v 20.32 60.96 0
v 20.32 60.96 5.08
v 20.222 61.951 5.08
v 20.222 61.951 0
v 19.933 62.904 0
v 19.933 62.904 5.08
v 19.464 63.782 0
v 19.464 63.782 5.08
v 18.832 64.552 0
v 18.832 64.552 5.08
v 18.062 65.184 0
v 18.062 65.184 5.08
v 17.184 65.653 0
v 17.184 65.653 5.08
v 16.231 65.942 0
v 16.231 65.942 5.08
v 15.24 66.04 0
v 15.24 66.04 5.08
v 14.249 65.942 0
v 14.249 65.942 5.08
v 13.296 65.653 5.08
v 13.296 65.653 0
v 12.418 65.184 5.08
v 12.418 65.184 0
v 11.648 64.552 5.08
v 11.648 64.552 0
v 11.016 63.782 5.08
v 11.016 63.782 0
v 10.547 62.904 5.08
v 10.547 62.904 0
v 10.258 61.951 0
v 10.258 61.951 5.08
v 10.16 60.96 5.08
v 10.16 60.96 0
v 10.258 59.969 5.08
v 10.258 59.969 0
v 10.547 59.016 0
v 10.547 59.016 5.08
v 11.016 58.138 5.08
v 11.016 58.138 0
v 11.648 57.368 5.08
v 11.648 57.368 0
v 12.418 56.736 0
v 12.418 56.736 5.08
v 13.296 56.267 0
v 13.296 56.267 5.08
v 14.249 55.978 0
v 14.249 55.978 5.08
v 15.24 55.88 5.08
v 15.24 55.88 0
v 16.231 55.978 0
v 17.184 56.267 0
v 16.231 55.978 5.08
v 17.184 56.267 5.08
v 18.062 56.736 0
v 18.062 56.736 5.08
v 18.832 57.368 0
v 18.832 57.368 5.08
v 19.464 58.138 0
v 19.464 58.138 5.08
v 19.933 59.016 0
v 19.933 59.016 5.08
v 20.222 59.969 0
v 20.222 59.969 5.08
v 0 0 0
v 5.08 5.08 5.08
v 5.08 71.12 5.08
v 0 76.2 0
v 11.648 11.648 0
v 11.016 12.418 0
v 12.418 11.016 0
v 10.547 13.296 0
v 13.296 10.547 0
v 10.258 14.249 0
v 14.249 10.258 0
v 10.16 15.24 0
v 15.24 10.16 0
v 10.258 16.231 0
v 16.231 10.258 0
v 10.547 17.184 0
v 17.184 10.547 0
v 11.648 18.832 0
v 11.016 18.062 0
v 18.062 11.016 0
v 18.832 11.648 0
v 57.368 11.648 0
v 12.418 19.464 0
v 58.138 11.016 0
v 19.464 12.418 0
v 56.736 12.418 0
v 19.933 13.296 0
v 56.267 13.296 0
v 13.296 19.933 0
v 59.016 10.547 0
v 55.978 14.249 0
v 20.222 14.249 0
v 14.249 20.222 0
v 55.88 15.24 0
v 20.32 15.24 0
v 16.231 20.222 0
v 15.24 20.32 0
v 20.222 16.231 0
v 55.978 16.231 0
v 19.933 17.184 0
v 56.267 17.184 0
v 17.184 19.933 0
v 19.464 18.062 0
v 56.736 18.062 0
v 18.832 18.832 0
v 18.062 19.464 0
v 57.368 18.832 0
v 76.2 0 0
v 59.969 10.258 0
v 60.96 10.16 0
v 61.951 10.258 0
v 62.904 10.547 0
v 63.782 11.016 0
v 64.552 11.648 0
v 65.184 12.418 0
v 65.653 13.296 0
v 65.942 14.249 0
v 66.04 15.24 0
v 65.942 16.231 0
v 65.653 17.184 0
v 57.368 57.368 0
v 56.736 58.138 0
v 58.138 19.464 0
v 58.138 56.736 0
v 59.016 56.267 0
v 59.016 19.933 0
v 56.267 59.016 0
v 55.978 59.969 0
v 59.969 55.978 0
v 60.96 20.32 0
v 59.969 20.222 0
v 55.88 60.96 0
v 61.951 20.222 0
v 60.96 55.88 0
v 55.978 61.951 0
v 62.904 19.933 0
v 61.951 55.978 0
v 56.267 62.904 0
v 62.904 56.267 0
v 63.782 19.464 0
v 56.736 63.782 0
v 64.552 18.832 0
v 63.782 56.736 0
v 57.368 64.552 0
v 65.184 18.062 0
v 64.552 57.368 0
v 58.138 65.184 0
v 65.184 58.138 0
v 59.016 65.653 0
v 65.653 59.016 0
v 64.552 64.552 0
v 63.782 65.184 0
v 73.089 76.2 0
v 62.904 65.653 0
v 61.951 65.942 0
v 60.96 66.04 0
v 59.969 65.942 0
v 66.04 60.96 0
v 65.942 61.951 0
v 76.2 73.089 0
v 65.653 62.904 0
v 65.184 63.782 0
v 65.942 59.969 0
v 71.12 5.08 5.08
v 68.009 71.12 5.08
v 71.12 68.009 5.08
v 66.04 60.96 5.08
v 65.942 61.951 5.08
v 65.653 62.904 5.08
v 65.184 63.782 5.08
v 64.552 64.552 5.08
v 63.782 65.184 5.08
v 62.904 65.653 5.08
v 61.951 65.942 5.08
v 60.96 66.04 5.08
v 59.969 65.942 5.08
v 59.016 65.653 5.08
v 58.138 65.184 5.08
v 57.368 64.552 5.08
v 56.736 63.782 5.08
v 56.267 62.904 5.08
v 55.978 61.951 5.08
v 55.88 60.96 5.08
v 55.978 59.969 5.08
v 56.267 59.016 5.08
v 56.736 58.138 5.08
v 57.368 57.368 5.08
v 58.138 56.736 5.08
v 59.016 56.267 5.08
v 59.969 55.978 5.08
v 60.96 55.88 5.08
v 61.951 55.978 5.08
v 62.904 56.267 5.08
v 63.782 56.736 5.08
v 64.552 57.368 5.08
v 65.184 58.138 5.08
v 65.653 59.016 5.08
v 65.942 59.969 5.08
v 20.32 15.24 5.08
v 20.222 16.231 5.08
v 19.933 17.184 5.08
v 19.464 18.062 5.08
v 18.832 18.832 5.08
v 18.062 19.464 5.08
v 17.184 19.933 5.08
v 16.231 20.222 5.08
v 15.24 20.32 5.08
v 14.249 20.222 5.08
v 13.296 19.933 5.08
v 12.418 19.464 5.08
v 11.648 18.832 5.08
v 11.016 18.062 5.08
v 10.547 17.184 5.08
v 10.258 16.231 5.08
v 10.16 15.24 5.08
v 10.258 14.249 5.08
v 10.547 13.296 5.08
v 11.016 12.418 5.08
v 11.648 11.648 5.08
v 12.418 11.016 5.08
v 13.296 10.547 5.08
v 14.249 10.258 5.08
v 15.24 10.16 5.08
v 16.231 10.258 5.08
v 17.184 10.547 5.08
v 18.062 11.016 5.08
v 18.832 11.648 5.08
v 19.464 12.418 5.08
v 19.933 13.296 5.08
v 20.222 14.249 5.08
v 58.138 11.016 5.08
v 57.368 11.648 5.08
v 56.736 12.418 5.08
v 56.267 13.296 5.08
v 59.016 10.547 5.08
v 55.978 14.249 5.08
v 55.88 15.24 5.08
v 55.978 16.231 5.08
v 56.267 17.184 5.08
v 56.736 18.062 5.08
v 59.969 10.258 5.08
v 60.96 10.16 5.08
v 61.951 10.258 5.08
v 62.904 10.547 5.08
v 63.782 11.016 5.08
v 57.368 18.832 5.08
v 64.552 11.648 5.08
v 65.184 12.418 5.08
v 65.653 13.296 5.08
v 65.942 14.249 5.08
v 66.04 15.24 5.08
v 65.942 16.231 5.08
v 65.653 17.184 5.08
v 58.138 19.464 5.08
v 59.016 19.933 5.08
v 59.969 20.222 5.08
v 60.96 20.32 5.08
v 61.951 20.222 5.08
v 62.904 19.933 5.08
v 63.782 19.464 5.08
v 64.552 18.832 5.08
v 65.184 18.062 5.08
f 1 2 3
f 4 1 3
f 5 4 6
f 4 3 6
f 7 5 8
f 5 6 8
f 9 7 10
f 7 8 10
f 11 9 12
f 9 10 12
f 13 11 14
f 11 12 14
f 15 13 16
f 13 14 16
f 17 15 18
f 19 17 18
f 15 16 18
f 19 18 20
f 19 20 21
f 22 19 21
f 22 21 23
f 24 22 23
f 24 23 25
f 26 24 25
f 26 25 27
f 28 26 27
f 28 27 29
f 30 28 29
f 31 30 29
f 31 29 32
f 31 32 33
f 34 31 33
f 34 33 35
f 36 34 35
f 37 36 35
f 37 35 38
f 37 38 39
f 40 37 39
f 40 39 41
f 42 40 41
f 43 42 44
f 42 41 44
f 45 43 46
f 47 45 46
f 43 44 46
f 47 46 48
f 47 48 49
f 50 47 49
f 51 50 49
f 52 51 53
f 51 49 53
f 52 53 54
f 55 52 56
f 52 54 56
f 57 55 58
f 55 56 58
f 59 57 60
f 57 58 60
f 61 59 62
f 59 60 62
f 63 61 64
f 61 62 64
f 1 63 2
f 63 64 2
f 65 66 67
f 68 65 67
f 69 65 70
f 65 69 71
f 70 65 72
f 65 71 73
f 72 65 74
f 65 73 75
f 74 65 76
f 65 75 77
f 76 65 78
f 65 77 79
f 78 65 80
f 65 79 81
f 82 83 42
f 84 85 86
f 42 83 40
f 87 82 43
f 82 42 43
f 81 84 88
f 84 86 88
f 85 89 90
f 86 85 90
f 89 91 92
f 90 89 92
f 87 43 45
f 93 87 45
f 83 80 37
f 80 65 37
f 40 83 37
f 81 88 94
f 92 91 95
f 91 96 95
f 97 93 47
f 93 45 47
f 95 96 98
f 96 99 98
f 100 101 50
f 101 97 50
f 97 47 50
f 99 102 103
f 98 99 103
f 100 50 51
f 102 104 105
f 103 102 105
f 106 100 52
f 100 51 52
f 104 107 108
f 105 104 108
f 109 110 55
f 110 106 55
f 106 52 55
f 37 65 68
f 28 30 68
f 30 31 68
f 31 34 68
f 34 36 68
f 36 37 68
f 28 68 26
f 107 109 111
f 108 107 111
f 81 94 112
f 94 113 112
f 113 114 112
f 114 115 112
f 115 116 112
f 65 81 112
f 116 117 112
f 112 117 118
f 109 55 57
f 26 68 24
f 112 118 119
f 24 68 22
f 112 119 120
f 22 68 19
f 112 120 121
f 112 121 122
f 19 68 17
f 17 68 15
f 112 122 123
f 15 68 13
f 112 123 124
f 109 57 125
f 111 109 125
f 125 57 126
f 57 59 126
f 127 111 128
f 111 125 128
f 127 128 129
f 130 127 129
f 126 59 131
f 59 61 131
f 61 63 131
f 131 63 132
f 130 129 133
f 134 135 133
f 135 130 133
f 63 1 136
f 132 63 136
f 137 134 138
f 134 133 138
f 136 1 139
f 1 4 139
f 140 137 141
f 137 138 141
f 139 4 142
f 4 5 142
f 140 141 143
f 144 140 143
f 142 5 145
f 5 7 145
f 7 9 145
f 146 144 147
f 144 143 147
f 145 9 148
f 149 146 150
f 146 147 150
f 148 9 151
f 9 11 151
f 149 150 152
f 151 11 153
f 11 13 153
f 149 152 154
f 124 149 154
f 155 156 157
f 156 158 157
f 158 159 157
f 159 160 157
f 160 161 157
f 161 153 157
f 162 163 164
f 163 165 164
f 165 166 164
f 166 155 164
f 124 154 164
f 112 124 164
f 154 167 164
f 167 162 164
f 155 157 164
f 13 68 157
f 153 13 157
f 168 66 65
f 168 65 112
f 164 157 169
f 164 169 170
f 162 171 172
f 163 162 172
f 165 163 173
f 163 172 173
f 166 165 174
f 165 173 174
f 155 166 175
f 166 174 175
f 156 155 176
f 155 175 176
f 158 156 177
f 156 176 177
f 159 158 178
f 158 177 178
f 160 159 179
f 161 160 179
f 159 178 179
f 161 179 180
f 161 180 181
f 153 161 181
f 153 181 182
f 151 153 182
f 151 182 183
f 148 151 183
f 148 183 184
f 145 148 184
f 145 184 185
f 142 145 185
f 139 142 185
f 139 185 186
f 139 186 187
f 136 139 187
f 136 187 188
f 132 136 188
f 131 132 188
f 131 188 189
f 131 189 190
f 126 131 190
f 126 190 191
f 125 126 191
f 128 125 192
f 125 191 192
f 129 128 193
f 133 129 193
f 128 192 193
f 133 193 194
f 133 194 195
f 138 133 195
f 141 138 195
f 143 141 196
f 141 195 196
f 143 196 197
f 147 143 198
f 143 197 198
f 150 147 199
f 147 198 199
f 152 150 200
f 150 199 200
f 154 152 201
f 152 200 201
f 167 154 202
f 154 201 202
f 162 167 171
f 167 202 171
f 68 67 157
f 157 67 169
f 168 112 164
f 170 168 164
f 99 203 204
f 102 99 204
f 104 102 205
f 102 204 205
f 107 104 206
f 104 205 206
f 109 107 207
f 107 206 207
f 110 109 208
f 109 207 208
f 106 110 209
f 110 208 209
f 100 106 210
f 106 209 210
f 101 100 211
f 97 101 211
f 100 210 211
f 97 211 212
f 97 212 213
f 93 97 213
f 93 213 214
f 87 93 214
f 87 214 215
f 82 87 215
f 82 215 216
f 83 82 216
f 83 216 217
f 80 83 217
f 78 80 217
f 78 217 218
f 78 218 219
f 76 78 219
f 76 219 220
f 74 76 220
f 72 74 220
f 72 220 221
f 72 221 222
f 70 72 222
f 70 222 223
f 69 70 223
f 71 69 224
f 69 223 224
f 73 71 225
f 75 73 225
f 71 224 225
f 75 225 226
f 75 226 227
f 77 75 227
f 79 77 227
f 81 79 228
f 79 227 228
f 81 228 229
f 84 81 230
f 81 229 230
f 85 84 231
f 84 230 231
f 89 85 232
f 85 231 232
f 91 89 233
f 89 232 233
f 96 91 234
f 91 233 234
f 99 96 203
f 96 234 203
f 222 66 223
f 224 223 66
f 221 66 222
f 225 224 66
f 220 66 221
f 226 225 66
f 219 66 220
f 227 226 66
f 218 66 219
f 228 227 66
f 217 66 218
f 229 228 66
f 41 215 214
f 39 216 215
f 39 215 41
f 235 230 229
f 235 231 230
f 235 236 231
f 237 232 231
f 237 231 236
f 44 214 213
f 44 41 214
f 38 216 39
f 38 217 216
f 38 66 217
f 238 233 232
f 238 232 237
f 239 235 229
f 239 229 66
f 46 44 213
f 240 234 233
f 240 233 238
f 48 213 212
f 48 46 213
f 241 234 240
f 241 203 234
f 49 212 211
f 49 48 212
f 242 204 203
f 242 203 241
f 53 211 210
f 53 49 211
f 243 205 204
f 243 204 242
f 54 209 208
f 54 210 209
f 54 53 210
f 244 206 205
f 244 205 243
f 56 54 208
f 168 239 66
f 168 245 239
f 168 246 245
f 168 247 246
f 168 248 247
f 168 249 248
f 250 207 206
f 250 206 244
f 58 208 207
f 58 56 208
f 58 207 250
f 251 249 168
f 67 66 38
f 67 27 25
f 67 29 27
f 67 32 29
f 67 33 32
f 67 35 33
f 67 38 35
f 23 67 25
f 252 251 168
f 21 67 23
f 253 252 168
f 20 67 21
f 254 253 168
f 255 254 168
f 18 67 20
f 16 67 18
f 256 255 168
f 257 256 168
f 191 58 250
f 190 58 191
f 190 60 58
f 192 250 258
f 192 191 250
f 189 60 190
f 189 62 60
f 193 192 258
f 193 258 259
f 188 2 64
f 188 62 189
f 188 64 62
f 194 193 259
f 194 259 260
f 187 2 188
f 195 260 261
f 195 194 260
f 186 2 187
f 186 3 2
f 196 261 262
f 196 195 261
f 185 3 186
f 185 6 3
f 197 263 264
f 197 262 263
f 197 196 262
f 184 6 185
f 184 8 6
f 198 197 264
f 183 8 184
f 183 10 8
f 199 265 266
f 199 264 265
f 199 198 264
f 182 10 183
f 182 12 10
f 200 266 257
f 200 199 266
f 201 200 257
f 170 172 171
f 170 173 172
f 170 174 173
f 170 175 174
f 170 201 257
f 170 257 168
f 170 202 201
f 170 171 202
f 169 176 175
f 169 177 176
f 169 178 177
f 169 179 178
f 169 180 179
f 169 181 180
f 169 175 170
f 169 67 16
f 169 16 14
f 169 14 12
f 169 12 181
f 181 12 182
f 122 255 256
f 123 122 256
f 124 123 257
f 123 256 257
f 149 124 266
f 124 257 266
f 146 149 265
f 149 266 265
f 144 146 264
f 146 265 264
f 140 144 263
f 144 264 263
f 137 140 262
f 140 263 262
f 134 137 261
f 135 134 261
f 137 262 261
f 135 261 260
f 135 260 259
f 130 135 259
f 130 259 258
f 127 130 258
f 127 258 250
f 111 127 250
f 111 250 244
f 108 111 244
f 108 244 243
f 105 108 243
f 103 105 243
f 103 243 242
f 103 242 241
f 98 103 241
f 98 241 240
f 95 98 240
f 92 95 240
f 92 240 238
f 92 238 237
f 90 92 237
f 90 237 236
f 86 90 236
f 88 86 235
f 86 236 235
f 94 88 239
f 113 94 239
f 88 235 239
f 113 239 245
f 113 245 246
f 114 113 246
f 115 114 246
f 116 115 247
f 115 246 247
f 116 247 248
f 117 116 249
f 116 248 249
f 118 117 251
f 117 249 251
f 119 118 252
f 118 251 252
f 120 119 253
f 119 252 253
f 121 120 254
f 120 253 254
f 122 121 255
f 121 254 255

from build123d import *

# Parameters (mm, degrees)
F0_W        = 76.2
F0_H        = 76.2
F1_DEPTH    = 5.08
F2_R        = 5.08
F3_DEPTH    = 25.4
F4_SIZE     = 5.07999
F5_T1_DEPTH = 21.9411964155


# Not quite as in the source:
# - a fillet or chamfer that OpenCascade refuses, or shapes differently, is made with other operations: its cross-section is extruded or revolved along the edge and cut away or added
# - a fillet or chamfer is up to 0.001 mm smaller than in the source, because OpenCascade refuses the exact size


with BuildPart() as f1:
    # F0 (on Top) → F1 (new body)
    with BuildSketch(Plane.XY):
        with Locations((38.1, 38.1)):
            Rectangle(F0_W, F0_H)
    extrude(amount=F1_DEPTH)

    # F2 (on face) → F3 (cut)
    with BuildSketch(Plane.XY.offset(5.08)):
        with Locations((15.24, 60.96)):
            Circle(F2_R)
        with Locations((60.96, 60.96)):
            Circle(F2_R)
        with Locations((15.24, 15.24)):
            Circle(F2_R)
        with Locations((60.96, 15.24)):
            Circle(F2_R)
    extrude(amount=-F3_DEPTH, mode=Mode.SUBTRACT)

    # F4 (size 5.08 in the source; OpenCascade refuses exactly that, so slightly less here)
    f4_edges = [f1.edges().sort_by_distance(p)[0] for p in [
        (38.1, 76.2, 5.08),
        (0, 38.1, 5.08),
        (76.2, 38.1, 5.08),
        (38.1, 0, 5.08),
    ]]
    chamfer(f4_edges, length=F4_SIZE)

    # F5: chamfer of 2.54 on 1 edges, made by hand

    # F5_s2 → F5_t1 (cut)
    with BuildSketch(Plane(origin=(54.5938794951, 54.5938794951, -54.5938794951), x_dir=(0.7071067812, -0.7071067812, 0), z_dir=(-0.5773502692, -0.5773502692, 0.5773502692))):
        Polygon((-2.1997045256, 60.9470476317), (2.1997045256, 60.9470476317), (0, 62.2170476317), align=None)
    extrude(amount=F5_T1_DEPTH, mode=Mode.SUBTRACT)


solid = f1.part
